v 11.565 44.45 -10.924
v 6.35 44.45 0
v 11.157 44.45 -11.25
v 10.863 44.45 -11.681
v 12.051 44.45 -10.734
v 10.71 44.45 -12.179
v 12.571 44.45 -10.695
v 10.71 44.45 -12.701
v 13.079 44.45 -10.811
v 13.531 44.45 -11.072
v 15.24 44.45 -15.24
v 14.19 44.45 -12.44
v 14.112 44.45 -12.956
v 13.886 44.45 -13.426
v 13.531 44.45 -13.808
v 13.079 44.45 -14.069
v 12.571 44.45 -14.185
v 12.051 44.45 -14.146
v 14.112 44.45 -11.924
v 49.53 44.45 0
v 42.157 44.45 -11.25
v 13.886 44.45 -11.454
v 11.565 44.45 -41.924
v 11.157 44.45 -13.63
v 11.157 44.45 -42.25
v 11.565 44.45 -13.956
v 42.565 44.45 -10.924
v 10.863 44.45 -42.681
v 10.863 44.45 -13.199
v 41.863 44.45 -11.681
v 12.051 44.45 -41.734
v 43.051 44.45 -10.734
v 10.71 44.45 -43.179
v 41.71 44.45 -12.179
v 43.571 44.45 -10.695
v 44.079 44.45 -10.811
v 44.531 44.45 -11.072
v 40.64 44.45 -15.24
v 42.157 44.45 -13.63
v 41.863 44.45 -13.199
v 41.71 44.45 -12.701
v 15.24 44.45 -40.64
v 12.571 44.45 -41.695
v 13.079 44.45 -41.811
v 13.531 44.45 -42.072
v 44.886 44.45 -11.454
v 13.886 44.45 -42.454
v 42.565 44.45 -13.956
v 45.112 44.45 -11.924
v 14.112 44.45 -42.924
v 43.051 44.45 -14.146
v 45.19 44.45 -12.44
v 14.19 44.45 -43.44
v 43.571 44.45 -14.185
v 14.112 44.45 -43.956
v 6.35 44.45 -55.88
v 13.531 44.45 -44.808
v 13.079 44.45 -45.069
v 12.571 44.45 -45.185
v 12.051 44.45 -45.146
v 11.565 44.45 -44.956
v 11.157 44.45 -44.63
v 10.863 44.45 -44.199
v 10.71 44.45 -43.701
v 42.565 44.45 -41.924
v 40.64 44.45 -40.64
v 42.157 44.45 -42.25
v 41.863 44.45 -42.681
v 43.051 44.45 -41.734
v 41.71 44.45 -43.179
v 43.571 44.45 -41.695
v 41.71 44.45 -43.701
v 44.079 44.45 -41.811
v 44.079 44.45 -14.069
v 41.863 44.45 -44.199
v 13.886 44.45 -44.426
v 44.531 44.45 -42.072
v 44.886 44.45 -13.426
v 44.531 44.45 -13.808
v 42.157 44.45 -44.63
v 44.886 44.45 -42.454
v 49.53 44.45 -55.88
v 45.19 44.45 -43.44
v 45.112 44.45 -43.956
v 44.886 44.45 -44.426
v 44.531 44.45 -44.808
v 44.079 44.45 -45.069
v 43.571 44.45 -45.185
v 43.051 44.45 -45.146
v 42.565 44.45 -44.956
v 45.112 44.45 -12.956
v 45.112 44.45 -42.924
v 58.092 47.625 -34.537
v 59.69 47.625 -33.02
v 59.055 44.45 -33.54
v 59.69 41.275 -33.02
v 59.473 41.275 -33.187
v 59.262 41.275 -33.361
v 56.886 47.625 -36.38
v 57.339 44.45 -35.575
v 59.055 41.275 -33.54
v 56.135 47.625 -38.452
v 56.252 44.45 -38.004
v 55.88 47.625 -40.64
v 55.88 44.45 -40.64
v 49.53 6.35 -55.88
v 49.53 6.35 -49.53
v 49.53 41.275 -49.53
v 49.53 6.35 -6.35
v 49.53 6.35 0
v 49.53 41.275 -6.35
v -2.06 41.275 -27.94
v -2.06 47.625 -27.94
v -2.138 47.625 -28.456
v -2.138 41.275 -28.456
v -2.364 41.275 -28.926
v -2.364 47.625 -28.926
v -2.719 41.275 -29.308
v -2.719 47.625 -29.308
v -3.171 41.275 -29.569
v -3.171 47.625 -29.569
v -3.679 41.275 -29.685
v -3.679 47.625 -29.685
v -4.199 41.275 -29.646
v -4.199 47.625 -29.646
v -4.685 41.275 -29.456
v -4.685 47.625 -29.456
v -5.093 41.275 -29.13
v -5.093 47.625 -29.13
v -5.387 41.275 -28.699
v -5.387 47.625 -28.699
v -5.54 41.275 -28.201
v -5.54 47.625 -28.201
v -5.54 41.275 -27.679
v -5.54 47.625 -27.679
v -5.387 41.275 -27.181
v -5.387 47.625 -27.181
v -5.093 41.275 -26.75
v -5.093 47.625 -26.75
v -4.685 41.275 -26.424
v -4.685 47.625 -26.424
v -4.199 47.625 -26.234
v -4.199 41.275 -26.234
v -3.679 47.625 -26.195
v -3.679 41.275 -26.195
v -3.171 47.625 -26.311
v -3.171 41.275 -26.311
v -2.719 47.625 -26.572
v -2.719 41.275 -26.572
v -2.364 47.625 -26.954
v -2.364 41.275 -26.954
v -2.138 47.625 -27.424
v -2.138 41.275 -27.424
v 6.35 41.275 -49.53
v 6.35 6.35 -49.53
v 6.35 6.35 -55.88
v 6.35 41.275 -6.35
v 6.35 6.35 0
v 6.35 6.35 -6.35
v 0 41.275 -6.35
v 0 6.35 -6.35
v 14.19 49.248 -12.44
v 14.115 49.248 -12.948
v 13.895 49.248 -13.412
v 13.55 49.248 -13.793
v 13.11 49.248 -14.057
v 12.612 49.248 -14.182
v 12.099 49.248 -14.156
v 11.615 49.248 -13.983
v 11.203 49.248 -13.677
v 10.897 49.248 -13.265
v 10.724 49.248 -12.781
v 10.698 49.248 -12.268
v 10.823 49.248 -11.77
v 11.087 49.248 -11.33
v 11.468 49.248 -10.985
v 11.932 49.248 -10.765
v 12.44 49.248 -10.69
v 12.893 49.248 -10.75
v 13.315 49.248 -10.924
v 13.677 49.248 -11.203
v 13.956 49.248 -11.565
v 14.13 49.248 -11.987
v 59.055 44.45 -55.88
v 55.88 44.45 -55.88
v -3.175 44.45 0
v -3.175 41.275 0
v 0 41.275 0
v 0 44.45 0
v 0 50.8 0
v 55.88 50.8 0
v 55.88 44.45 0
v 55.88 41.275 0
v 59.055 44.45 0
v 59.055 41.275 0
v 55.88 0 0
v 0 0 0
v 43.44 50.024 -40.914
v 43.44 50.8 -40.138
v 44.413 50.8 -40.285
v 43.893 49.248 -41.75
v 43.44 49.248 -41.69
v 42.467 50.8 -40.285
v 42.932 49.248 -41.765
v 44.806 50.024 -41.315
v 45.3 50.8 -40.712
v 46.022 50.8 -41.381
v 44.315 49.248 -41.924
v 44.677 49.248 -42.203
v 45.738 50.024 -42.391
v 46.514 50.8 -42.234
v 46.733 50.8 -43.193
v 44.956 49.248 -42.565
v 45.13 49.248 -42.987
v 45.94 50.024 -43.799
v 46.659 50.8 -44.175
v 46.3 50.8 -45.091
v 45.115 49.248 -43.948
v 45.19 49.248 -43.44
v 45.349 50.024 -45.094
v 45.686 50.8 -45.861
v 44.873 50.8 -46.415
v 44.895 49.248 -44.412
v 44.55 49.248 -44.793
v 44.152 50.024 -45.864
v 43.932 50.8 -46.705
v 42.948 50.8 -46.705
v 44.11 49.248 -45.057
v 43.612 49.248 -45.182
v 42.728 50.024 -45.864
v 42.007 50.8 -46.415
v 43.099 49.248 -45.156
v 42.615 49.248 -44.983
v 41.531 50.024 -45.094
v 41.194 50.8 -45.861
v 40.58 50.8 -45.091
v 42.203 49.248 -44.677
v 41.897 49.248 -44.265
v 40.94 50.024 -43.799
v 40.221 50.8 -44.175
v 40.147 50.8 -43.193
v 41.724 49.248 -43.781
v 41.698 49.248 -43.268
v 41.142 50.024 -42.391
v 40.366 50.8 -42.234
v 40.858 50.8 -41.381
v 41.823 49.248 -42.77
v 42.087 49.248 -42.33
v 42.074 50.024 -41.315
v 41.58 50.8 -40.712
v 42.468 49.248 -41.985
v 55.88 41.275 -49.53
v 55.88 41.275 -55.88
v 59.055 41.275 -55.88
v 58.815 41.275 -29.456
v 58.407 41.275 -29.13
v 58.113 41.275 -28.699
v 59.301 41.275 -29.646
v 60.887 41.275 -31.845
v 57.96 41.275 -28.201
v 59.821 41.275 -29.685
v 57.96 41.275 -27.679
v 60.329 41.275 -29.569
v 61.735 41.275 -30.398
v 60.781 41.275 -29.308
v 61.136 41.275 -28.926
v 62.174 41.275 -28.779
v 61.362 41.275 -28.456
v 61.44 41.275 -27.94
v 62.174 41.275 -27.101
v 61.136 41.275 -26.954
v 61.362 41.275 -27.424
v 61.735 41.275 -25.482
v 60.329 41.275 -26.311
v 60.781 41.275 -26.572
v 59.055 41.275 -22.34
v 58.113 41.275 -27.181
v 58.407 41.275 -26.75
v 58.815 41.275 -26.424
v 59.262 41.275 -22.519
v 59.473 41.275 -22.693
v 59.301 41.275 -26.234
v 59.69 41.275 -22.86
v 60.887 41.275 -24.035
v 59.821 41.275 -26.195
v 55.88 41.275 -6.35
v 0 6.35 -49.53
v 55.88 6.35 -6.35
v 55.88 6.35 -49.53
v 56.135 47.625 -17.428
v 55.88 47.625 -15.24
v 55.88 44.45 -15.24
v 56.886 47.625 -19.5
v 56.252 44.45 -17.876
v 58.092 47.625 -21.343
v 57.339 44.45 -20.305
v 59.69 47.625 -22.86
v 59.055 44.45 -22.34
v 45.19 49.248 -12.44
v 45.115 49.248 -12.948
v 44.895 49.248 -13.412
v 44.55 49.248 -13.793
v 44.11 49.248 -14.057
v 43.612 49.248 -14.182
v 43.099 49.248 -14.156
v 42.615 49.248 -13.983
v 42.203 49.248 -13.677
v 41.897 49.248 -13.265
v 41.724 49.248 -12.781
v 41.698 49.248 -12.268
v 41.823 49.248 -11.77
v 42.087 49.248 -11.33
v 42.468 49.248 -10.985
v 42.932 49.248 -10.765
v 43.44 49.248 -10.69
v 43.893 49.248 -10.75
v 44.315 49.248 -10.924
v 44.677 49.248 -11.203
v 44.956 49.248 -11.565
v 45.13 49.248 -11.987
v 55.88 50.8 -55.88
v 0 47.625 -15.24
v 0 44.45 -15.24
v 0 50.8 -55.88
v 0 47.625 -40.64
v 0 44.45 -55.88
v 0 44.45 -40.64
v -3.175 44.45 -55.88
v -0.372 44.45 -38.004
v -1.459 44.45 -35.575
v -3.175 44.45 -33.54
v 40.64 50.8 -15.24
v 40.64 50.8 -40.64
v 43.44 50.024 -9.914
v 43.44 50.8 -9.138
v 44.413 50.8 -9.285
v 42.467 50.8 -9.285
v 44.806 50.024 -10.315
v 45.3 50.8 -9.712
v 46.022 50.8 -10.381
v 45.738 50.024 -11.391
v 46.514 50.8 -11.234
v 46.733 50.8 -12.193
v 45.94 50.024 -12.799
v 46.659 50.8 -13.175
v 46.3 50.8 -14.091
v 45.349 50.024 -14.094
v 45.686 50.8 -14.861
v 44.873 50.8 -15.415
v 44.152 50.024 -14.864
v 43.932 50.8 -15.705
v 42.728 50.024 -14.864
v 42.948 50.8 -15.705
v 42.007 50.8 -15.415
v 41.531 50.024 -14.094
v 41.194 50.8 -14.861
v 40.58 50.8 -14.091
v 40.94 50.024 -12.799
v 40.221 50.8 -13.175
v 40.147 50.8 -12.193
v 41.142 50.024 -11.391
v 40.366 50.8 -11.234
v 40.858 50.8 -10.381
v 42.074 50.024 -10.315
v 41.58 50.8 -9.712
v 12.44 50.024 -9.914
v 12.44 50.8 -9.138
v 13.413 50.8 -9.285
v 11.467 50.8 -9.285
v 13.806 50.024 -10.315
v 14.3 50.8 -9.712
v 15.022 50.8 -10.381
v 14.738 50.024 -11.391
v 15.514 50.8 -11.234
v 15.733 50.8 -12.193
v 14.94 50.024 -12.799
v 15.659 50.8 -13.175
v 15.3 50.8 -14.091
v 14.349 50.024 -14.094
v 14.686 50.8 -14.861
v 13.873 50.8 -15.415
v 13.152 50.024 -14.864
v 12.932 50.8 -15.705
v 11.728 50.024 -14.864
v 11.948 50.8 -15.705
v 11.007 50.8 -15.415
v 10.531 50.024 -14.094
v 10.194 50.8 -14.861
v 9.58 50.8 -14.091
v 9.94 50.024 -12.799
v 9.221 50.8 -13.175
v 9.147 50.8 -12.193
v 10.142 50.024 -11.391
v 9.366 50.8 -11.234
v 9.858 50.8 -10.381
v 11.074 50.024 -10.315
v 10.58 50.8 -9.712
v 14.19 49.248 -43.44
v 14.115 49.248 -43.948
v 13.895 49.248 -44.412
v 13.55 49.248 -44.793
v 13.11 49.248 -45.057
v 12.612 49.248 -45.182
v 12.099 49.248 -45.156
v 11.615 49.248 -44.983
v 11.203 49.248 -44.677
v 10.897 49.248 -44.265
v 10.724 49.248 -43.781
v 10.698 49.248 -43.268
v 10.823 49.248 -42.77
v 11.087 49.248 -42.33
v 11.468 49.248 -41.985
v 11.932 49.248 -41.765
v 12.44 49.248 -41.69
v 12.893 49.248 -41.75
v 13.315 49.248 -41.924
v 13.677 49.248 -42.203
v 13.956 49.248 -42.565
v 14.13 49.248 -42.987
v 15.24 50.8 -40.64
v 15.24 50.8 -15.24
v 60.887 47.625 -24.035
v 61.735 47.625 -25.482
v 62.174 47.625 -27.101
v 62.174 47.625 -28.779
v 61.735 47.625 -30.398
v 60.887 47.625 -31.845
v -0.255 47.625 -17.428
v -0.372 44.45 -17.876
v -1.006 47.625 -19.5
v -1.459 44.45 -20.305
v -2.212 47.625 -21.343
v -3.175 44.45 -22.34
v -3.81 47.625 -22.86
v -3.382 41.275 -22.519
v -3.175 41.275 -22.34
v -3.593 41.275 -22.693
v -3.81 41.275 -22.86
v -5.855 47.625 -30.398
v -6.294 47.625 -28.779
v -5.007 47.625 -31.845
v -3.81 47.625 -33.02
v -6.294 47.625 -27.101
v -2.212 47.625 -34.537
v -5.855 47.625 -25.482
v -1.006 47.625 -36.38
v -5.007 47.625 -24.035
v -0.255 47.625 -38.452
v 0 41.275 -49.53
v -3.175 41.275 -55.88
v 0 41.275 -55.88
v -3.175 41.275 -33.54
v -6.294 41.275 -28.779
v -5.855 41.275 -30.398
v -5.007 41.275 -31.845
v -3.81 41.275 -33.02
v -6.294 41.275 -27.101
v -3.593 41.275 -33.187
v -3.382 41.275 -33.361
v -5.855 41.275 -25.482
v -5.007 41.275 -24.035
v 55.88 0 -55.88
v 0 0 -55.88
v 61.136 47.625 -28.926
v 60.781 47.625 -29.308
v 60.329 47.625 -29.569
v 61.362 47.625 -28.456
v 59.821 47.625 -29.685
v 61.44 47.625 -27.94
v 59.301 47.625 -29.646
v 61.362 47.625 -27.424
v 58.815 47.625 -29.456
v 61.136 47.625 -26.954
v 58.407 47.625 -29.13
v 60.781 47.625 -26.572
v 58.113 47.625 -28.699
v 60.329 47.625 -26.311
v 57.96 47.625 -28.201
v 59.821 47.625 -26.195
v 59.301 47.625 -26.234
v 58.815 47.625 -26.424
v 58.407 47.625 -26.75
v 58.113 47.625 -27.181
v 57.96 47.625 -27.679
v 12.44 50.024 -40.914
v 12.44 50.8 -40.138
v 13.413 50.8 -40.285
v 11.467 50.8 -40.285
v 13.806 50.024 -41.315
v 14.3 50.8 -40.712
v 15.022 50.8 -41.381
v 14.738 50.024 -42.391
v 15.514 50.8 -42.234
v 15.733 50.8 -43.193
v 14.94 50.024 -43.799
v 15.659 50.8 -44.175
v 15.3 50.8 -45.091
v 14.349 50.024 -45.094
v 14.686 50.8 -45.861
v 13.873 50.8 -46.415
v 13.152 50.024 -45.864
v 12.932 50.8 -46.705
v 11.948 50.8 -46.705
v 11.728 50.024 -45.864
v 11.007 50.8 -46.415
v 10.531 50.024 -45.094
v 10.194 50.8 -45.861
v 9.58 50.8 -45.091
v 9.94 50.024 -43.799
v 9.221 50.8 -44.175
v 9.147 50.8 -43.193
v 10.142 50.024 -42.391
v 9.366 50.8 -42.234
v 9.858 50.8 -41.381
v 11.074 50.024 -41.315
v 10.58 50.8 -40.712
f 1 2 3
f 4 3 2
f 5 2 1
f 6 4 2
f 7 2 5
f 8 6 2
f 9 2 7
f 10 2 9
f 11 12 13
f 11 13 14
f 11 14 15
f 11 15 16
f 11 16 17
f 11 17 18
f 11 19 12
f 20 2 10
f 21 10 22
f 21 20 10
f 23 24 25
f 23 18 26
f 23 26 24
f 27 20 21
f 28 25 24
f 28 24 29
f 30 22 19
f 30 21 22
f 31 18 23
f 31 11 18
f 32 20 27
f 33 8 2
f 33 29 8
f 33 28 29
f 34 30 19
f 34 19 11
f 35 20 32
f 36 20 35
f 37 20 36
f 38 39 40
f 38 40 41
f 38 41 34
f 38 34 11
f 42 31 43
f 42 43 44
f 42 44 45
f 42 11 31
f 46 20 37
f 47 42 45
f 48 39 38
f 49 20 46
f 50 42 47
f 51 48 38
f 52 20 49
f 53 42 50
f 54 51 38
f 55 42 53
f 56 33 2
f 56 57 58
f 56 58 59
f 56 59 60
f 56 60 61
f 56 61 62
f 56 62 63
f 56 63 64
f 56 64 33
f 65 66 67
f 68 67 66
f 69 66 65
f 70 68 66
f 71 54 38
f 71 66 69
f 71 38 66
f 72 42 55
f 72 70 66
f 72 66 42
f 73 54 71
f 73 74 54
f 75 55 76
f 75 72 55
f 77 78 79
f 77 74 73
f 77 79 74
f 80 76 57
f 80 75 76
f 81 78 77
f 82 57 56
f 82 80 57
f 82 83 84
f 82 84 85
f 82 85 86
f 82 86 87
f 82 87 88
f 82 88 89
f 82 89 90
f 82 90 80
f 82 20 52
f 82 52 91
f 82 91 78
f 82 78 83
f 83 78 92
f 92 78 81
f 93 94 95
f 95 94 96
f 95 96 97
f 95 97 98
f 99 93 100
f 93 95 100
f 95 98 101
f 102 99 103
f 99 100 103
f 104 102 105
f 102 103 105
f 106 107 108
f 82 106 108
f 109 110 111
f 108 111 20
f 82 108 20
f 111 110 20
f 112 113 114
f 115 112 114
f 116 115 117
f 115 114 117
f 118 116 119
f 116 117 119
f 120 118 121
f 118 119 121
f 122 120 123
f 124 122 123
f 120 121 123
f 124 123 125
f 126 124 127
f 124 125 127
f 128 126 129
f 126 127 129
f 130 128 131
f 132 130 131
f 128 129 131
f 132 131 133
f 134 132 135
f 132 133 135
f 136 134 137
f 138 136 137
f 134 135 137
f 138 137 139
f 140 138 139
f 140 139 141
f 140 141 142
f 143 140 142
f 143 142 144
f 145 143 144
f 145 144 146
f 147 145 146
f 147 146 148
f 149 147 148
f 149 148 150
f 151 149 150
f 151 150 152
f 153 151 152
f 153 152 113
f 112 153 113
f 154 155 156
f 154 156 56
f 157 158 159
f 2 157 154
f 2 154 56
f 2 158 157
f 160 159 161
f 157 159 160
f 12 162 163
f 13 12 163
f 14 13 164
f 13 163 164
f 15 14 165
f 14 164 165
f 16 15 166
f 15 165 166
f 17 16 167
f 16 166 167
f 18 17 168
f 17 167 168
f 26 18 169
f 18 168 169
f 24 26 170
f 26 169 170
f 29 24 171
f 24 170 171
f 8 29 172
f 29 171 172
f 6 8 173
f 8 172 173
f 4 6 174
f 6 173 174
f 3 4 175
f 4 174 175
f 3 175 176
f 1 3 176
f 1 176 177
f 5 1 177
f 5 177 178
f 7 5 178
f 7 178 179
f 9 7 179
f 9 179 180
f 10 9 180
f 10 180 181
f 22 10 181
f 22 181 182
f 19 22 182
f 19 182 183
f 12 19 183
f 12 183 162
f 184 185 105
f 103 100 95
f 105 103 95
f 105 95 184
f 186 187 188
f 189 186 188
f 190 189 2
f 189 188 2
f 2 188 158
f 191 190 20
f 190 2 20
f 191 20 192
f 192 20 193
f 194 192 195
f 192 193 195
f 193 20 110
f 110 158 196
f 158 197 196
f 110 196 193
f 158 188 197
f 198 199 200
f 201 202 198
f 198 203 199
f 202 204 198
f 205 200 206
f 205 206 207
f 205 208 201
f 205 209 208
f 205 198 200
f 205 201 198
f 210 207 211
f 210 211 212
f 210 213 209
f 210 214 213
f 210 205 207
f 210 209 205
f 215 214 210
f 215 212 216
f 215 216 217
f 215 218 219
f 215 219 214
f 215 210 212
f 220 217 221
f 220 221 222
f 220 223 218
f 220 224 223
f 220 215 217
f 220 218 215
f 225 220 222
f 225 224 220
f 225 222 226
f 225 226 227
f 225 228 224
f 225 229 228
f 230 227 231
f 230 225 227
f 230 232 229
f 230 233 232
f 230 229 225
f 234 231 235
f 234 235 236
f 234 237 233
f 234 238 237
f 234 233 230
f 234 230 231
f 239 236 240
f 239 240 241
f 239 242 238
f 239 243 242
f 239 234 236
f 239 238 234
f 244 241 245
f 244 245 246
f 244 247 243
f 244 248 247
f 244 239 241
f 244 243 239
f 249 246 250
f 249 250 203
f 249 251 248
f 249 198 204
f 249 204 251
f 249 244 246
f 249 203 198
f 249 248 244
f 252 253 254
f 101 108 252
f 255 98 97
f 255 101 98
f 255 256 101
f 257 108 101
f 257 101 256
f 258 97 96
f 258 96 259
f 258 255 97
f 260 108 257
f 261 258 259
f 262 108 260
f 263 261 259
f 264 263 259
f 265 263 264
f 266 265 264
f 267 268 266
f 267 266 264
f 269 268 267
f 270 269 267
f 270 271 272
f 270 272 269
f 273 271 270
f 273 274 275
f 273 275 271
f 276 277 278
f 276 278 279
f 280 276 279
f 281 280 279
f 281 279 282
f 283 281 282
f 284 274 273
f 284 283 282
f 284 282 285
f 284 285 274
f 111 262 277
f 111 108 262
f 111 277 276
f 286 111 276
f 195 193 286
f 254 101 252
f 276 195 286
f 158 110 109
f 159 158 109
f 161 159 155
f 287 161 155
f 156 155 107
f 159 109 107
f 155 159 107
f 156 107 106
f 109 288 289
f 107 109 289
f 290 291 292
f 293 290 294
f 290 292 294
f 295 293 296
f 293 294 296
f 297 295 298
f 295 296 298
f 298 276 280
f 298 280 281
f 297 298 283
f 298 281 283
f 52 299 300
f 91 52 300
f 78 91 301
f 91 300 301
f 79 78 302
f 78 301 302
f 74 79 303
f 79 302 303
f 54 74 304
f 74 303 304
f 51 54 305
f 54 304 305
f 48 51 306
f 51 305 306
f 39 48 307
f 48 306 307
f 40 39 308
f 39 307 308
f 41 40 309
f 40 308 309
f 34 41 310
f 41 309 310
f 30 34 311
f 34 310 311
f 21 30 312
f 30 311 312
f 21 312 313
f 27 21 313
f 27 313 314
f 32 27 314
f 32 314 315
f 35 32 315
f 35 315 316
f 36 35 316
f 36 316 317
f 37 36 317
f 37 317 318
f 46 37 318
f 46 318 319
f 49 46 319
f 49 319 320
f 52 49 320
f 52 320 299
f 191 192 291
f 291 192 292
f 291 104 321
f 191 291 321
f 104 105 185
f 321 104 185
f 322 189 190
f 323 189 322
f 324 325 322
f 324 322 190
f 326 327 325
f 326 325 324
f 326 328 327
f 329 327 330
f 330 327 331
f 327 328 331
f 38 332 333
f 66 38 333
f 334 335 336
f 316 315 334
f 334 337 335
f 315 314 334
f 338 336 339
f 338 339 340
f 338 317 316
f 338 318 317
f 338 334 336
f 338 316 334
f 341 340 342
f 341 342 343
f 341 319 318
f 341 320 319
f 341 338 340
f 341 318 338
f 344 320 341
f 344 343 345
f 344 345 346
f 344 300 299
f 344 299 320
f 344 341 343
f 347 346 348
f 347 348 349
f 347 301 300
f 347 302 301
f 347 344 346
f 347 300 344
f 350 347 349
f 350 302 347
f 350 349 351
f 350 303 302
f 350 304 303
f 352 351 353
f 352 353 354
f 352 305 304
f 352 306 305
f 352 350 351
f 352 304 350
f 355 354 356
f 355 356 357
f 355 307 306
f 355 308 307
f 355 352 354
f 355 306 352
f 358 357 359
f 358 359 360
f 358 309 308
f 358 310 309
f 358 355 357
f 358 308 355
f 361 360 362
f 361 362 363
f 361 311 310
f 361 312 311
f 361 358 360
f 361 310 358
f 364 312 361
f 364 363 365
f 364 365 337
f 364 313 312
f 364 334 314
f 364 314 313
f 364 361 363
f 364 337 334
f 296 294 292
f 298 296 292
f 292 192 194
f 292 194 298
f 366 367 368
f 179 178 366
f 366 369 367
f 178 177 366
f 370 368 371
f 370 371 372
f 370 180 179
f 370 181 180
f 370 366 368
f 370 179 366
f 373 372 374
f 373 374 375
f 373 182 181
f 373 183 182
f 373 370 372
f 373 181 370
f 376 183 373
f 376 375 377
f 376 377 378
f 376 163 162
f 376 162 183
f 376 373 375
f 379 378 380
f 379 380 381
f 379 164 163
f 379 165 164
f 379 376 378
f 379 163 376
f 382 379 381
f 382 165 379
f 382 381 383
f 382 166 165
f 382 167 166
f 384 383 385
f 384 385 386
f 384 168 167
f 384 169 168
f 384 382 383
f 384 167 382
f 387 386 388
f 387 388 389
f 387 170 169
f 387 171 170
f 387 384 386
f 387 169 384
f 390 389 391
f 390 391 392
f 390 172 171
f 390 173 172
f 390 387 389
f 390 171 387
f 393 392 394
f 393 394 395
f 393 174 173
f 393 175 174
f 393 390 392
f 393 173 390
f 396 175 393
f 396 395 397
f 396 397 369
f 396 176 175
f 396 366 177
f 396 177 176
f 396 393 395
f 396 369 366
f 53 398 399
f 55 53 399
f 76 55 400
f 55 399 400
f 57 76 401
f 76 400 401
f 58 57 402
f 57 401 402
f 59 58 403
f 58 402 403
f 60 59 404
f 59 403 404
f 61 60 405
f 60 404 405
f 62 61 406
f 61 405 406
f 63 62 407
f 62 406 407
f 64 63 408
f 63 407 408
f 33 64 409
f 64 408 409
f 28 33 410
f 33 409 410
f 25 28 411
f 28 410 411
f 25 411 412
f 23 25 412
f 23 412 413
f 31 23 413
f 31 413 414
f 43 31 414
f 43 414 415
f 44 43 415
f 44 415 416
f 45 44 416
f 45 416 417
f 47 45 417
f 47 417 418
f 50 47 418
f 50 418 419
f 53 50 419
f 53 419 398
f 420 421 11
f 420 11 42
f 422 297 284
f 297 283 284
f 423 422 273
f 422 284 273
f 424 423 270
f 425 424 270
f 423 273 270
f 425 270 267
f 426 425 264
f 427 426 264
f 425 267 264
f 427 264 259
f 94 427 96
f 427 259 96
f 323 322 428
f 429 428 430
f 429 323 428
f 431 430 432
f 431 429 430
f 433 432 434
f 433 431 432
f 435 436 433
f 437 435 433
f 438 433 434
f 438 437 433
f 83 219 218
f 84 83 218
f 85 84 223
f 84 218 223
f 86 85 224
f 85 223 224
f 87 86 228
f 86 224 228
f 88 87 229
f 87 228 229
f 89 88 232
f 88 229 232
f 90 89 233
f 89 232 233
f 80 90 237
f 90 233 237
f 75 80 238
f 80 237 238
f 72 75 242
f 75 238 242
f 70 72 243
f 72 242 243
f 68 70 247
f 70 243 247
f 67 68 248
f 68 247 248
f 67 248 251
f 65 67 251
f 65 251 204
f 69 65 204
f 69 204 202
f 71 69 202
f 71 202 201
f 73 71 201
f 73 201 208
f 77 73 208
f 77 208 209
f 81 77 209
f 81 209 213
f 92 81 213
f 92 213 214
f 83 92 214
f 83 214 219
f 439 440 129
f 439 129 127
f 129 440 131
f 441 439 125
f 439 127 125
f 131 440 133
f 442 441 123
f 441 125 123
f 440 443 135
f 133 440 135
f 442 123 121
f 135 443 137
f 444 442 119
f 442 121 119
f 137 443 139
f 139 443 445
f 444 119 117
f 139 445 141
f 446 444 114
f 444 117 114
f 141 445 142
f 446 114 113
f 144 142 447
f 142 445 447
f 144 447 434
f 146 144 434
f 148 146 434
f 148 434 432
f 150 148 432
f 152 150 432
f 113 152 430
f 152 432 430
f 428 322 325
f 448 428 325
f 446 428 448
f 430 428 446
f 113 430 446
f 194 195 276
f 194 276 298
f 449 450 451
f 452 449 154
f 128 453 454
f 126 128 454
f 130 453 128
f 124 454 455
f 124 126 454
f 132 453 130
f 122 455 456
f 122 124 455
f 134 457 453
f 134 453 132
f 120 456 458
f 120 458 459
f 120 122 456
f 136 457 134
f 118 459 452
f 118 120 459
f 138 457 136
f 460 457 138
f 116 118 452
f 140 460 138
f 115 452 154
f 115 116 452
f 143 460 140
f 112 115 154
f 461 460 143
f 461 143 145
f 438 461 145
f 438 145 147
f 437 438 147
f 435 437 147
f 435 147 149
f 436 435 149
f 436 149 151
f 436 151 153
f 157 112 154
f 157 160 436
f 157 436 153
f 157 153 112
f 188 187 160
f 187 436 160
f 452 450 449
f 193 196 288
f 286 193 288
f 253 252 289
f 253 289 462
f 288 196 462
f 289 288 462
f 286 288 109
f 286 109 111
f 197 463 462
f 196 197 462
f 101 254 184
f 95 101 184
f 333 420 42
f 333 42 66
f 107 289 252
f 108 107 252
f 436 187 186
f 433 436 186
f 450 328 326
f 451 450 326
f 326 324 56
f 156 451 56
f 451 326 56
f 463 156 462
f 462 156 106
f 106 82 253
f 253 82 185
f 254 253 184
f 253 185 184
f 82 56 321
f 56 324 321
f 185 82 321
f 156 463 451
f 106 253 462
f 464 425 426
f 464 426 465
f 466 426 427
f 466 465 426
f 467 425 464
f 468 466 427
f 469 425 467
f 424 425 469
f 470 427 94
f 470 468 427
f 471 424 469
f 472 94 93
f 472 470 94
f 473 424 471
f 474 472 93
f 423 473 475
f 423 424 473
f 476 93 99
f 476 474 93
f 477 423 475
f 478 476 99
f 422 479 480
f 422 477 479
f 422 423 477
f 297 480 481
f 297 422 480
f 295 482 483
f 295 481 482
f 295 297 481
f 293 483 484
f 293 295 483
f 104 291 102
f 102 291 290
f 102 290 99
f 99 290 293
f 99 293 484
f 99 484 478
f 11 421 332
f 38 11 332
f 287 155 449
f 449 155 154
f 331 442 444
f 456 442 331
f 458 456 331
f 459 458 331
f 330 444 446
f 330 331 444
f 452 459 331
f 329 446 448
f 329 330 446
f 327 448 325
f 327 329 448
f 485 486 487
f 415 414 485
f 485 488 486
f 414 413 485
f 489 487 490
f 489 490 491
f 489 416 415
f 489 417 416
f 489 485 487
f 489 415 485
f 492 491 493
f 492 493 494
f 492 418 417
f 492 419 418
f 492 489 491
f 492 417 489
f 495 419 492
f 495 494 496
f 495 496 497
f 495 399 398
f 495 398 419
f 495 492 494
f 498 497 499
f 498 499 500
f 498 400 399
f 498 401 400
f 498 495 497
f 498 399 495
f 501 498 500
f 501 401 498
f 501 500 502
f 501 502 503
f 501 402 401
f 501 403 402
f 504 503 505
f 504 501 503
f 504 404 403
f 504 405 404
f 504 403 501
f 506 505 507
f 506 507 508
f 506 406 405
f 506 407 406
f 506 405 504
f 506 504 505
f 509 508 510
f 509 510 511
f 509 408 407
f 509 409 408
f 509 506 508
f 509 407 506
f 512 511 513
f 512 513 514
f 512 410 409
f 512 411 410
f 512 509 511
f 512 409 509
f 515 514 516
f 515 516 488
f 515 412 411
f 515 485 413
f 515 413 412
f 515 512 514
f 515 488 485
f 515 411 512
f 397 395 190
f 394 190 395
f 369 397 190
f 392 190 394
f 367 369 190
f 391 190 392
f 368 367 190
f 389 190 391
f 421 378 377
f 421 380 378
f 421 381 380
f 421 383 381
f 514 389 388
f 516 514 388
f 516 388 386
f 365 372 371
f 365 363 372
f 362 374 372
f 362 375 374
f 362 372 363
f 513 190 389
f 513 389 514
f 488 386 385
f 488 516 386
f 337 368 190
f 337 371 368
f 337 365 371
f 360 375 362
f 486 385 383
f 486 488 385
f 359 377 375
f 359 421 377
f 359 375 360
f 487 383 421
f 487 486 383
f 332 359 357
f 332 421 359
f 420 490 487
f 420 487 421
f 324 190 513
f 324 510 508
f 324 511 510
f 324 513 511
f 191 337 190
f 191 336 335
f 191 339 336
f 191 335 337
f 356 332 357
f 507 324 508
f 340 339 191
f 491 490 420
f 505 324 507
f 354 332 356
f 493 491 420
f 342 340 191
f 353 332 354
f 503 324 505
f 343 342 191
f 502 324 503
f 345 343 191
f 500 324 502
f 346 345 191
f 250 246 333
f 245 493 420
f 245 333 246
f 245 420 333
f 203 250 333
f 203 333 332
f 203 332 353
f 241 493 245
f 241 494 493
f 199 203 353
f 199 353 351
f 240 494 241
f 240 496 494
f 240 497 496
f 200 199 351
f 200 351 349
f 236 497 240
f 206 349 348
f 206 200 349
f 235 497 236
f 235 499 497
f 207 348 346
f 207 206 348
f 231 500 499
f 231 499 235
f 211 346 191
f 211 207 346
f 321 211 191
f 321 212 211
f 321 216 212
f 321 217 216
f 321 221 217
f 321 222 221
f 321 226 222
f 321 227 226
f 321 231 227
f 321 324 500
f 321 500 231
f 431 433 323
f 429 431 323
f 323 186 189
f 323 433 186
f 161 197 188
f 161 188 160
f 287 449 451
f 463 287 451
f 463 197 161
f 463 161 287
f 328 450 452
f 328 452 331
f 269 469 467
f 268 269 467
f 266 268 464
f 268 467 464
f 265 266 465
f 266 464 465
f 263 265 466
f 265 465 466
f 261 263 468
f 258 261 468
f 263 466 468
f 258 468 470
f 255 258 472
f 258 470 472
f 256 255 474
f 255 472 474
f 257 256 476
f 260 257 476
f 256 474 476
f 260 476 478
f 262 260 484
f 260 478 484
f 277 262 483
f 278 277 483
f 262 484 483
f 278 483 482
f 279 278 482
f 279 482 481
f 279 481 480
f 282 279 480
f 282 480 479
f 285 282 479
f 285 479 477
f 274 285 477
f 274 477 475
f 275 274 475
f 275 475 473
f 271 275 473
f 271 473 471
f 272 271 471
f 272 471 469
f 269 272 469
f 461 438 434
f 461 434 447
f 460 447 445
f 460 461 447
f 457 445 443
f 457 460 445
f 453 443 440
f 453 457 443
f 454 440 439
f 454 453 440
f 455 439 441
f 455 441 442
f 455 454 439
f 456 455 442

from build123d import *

# Parameters (mm, degrees)
SKETCH1_W                = 55.88
SKETCH1_H                = 55.88
BOSS_EXTRUDE1_DEPTH      = 50.8
SKETCH2_W                = 43.18
SKETCH2_H                = 38.1
CUT_EXTRUDE1_DEPTH       = 56.88
SKETCH3_W                = 43.18
SKETCH3_H                = 38.1
CUT_EXTRUDE2_DEPTH       = 56.88
SKETCH4_R                = 1.75
SKETCH4_W                = 25.4
SKETCH4_H                = 25.4
CUT_EXTRUDE3_DEPTH       = 44.45
BOSS_EXTRUDE2_DEPTH      = 3.175
BOSS_EXTRUDE2_DEPTH_BACK = 3.175
SKETCH10_W               = 9.525
SKETCH10_H               = 3.175
BOSS_EXTRUDE5_DEPTH      = 55.88
SKETCH11_R               = 1.75
CUT_EXTRUDE4_DEPTH       = 48.625


with BuildPart() as part:
    # Sketch1 → Boss-Extrude1 (new body)
    with BuildSketch(Plane(origin=(0, 0, 0), x_dir=(1, 0, 0), z_dir=(0, 1, 0))):
        with Locations((27.94, 27.94)):
            Rectangle(SKETCH1_W, SKETCH1_H)
    extrude(amount=BOSS_EXTRUDE1_DEPTH)

    # Sketch2 → Cut-Extrude1 (cut, through all)
    with BuildSketch(Plane.XY):
        with Locations((27.94, 25.4)):
            Rectangle(SKETCH2_W, SKETCH2_H)
    extrude(amount=-CUT_EXTRUDE1_DEPTH, mode=Mode.SUBTRACT)

    # Sketch3 → Cut-Extrude2 (cut, through all)
    with BuildSketch(Plane(origin=(55.88, 0, 0), x_dir=(0, 0, -1), z_dir=(1, 0, 0))):
        with Locations((27.94, 25.4)):
            Rectangle(SKETCH3_W, SKETCH3_H)
    extrude(amount=-CUT_EXTRUDE2_DEPTH, mode=Mode.SUBTRACT)

    # Sketch4 → Cut-Extrude3 (cut)
    with BuildSketch(Plane(origin=(0, 50.8, 0), x_dir=(1, 0, 0), z_dir=(0, 1, 0))):
        with Locations((43.44, 43.44)):
            Circle(SKETCH4_R)
        with Locations((43.44, 12.44)):
            Circle(SKETCH4_R)
        with Locations((12.44, 12.44)):
            Circle(SKETCH4_R)
        with Locations((12.44, 43.44)):
            Circle(SKETCH4_R)
        with Locations((27.94, 27.94)):
            Rectangle(SKETCH4_W, SKETCH4_H)
    extrude(amount=-CUT_EXTRUDE3_DEPTH, mode=Mode.SUBTRACT)

    # Sketch5 → Cut-Revolve1 (revolve, cut)
    with BuildSketch(Plane(origin=(12.44, 0, 0), x_dir=(0, 0, -1), z_dir=(1, 0, 0))):
        Polygon((43.44, 50.8), (40.138, 50.8), (43.44, 47.498), align=None)
    revolve(axis=Axis((12.44, 47.498, -43.44), (0, 1, 0)), mode=Mode.SUBTRACT)

    # Sketch6 → Cut-Revolve2 (revolve, cut)
    with BuildSketch(Plane(origin=(12.44, 0, 0), x_dir=(0, 0, -1), z_dir=(1, 0, 0))):
        Polygon((12.44, 50.8), (9.138, 50.8), (12.44, 47.498), align=None)
    revolve(axis=Axis((12.44, 47.498, -12.44), (0, 1, 0)), mode=Mode.SUBTRACT)

    # Sketch7 → Cut-Revolve3 (revolve, cut)
    with BuildSketch(Plane(origin=(43.44, 0, 0), x_dir=(0, 0, -1), z_dir=(1, 0, 0))):
        Polygon((43.44, 50.8), (40.138, 50.8), (43.44, 47.498), align=None)
    revolve(axis=Axis((43.44, 47.498, -43.44), (0, 1, 0)), mode=Mode.SUBTRACT)

    # Sketch8 → Cut-Revolve4 (revolve, cut)
    with BuildSketch(Plane(origin=(43.44, 0, 0), x_dir=(0, 0, -1), z_dir=(1, 0, 0))):
        Polygon((12.44, 50.8), (9.138, 50.8), (12.44, 47.498), align=None)
    revolve(axis=Axis((43.44, 47.498, -12.44), (0, 1, 0)), mode=Mode.SUBTRACT)

    # Sketch9 → Boss-Extrude2 (add, two sides)
    with BuildSketch(Plane.XZ.offset(-44.45)) as boss_extrude2_sk:
        with BuildLine():
            Line((0, -40.64), (0, -15.24))
            ThreePointArc((0, -15.24), (-1.005581006, -19.499709497), (-3.81, -22.86))
            ThreePointArc((-3.81, -22.86), (-6.35, -27.94), (-3.81, -33.02))
            ThreePointArc((-3.81, -33.02), (-1.005581006, -36.380290503), (0, -40.64))
        make_face()
        with BuildLine():
            Line((55.88, -40.64), (55.88, -15.24))
            ThreePointArc((55.88, -15.24), (56.885581006, -19.499709497), (59.69, -22.86))
            ThreePointArc((59.69, -22.86), (62.23, -27.94), (59.69, -33.02))
            ThreePointArc((59.69, -33.02), (56.885581006, -36.380290503), (55.88, -40.64))
        make_face()
    extrude(amount=BOSS_EXTRUDE2_DEPTH)
    extrude(boss_extrude2_sk.sketch, amount=-BOSS_EXTRUDE2_DEPTH_BACK)

    # Sketch10 → Boss-Extrude5 (add)
    with BuildSketch(Plane.XY):
        with Locations((54.2925, 42.8625)):
            Rectangle(SKETCH10_W, SKETCH10_H)
        with Locations((1.5875, 42.8625)):
            Rectangle(SKETCH10_W, SKETCH10_H)
    extrude(amount=-BOSS_EXTRUDE5_DEPTH)

    # Sketch11 → Cut-Extrude4 (cut, through all)
    with BuildSketch(Plane(origin=(0, 47.625, 0), x_dir=(1, 0, 0), z_dir=(0, 1, 0))):
        with Locations((-3.81, 27.94)):
            Circle(SKETCH11_R)
        with Locations((59.69, 27.94)):
            Circle(SKETCH11_R)
    extrude(amount=-CUT_EXTRUDE4_DEPTH, mode=Mode.SUBTRACT)


solid = part.part
